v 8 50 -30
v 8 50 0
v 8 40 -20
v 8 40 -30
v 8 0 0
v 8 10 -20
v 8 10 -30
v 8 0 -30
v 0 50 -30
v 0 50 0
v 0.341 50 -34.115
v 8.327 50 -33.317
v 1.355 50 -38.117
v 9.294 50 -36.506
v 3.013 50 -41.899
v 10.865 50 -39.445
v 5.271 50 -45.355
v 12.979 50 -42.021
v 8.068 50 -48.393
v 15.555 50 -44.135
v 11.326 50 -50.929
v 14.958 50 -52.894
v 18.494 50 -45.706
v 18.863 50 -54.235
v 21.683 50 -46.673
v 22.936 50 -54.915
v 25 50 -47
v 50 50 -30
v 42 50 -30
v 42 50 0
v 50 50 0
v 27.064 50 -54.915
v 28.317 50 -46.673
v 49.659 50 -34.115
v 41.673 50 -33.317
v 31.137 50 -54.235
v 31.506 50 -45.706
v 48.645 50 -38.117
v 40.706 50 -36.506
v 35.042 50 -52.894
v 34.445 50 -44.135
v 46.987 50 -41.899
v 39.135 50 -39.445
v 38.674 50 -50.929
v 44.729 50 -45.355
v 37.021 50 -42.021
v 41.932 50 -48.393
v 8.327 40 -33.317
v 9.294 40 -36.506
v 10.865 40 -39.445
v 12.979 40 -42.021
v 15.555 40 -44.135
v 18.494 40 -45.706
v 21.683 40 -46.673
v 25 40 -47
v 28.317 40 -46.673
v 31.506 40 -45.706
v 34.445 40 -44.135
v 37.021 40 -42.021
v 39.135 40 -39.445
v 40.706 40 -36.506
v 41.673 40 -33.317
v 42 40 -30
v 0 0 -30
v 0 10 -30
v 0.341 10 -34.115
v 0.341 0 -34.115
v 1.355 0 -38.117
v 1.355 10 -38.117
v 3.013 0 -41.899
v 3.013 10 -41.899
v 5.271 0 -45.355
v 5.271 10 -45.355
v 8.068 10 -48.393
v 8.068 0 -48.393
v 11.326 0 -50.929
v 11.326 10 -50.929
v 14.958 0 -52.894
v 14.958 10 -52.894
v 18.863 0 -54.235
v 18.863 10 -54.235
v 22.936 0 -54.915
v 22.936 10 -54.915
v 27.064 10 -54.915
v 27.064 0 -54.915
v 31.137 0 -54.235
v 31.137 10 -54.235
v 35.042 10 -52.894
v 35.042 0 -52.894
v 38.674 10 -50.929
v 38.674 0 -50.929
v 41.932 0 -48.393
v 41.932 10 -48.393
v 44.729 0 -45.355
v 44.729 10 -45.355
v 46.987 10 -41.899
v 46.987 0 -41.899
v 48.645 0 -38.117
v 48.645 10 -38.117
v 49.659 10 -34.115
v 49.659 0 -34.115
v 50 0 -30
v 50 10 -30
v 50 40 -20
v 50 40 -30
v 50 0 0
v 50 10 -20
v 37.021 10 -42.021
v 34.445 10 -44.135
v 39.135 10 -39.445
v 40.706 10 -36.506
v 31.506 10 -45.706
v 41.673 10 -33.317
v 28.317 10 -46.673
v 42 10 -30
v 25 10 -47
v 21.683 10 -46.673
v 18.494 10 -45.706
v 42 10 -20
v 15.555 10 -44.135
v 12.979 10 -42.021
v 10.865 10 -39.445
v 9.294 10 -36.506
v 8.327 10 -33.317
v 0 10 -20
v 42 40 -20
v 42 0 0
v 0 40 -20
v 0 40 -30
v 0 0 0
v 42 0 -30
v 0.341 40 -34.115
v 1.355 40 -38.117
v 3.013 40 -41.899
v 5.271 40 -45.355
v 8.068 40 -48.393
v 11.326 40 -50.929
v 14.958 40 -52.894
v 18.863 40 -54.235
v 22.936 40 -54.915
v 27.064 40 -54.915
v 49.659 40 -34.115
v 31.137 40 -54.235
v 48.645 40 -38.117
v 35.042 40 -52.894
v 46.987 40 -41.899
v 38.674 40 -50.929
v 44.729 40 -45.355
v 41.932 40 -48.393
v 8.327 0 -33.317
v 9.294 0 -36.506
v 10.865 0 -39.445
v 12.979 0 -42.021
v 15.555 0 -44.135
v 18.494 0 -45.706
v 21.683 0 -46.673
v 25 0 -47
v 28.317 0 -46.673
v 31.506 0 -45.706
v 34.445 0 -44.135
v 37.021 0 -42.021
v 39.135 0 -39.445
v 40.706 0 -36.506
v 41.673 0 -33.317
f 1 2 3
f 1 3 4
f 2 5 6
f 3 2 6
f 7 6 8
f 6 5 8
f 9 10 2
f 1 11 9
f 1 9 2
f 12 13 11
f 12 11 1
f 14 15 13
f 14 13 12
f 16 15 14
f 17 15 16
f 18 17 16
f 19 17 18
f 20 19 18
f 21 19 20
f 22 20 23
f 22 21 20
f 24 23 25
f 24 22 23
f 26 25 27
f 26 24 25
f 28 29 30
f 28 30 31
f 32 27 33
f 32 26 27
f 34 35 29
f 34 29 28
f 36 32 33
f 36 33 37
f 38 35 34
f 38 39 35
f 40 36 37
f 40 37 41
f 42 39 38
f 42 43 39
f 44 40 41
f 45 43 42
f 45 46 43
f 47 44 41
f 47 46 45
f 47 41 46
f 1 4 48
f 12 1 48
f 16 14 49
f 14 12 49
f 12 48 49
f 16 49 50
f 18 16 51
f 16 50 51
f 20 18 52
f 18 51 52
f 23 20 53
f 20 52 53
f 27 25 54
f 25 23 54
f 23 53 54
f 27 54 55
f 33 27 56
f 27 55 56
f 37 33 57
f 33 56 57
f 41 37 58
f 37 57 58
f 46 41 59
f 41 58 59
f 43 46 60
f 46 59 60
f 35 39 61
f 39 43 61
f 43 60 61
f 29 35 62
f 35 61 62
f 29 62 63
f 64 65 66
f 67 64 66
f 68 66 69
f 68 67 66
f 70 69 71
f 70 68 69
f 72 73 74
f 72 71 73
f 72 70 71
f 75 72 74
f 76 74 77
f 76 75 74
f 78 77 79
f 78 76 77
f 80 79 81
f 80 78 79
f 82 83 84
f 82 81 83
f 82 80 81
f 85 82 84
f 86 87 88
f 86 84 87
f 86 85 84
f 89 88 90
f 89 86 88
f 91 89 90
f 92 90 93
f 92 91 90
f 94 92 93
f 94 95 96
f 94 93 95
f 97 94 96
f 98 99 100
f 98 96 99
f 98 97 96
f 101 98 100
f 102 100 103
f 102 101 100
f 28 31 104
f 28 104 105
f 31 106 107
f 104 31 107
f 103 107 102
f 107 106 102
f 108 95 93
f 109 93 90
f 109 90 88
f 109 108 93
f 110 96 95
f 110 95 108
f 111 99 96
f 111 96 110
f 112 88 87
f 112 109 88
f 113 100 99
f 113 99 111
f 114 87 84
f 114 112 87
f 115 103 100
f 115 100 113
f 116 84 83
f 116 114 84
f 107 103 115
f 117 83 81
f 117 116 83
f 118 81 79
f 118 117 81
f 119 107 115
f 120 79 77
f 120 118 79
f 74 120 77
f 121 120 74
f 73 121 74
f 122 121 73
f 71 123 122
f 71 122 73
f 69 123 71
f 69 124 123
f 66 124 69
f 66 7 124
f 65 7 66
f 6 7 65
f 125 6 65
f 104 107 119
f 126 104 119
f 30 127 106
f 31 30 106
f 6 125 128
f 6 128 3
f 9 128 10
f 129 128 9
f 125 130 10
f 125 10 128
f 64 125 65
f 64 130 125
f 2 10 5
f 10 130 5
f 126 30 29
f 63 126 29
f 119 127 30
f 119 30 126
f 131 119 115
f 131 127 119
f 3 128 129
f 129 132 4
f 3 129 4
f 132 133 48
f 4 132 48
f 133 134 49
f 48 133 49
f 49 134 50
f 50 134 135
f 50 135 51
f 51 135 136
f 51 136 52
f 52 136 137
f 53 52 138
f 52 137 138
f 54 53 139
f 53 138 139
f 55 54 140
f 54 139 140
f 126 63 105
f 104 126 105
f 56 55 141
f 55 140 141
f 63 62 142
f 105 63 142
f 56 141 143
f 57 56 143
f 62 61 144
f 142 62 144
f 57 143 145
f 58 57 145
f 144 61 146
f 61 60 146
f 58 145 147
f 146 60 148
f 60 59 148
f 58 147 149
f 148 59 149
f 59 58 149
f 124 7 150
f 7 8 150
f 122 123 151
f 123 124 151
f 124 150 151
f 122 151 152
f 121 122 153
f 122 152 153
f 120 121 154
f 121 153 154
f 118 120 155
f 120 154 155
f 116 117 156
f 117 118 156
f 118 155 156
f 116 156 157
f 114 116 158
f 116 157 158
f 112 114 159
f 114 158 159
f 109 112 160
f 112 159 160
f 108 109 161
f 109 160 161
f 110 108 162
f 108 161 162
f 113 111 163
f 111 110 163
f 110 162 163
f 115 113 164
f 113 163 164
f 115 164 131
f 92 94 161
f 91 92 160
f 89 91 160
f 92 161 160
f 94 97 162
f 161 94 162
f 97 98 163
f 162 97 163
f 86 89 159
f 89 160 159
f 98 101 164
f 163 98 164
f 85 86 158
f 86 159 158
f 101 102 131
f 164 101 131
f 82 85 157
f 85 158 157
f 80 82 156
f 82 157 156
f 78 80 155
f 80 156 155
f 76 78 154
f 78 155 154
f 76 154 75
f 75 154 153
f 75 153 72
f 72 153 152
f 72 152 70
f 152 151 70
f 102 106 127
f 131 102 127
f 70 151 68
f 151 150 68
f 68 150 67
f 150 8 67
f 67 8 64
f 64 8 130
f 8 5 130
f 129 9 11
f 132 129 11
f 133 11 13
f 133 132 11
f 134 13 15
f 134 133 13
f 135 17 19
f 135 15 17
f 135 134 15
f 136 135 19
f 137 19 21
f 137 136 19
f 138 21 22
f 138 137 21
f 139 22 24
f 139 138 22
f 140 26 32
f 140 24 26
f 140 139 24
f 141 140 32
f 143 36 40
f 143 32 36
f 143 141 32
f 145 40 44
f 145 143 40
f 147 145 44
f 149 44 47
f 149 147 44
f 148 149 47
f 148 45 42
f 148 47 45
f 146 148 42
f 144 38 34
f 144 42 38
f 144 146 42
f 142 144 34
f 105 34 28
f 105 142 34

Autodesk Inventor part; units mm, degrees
ref_plane "YZ Plane" through (0, 0, 0) normal (1, 0, 0) x (0, 1, 0)
ref_plane "XZ Plane" through (0, 0, 0) normal (0, 1, 0) x (-1, 0, 0)
ref_plane "XY Plane" through (0, 0, 0) normal (0, 0, 1) x (1, 0, 0)
sketch "草圖1" plane through (0, 0, 0) normal (0, 1, 0) x (-1, 0, 0)
  line L0 (0, 0) -> (-8, 0)
  line L1 (-8, 0) -> (-8, -30)
  line L2 (0, 0) -> (0, -30)
  arc A0 (-42, -30) -> (-8, -30) centre (-25, -30) ccw
  arc A1 (-50, -30) -> (0, -30) centre (-25, -30) ccw
  line L3 (6.1696, -30) -> (-69.0697, -30) construction
  line L4 (-25, -30) -> (-25, -20.8656)
  line L5 (-42, 0) -> (-42, -30)
  line L6 (-50, 0) -> (-50, -30)
  line L7 (-42, 0) -> (-50, 0)
  dimension "d8" = 30
  dimension "d9" = 8
  dimension "d10" = 25
  dimension "d11" = 17
extrude "擠出1" add sketch "草圖1" along normal blind 10
sketch "草圖2" plane through (0, 10, 0) normal (0, 1, 0) x (1, 0, 0)
  line L0 (0, 30) -> (0, 0) projected
  line L1 (0, 0) -> (0, 20)
  line L2 (0, 20) -> (8, 20)
  line L3 (8, 0) -> (8, 30) projected
  line L4 (8, 20) -> (8, 0)
  line L5 (8, 0) -> (0, 0)
  arc A0 (42, 30) -> (8, 30) centre (25, 30) ccw projected
  line L6 (25, 30) -> (25, 60.7006)
  line L7 (50, 20) -> (50, 0)
  line L8 (50, 0) -> (50, 20)
  line L9 (50, 20) -> (42, 20)
  line L10 (42, 0) -> (42, 20)
  line L11 (42, 20) -> (42, 0)
  line L12 (42, 0) -> (50, 0)
  point P0 (50, 30)
  dimension "d14" = 20
extrude "擠出2" add sketch "草圖2" along normal blind 30
sketch "草圖3" plane through (0, 40, 0) normal (0, 1, 0) x (1, 0, 0)
  line L0 (0, 20) -> (8, 20) projected
  line L1 (8, 20) -> (8, 30) projected
  arc A0 (42, 30) -> (8, 30) centre (25, 30) ccw projected
  line L2 (42, 30) -> (42, 20) projected
  line L3 (42, 20) -> (50, 20) projected
  line L4 (50, 20) -> (50, 30) projected
  arc A1 (50, 30) -> (0, 30) centre (25, 30) ccw projected
  line L5 (0, 30) -> (0, 20) projected
  line L6 (0, 0) -> (8, 0) projected
  line L7 (8, 0) -> (8, 20) projected
  line L8 (8, 20) -> (0, 20) projected
  line L9 (0, 20) -> (0, 0) projected
  line L10 (50, 0) -> (50, 20) projected
  line L11 (50, 20) -> (42, 20) projected
  line L12 (42, 20) -> (42, 0) projected
  line L13 (42, 0) -> (50, 0) projected
extrude "擠出3" add sketch "草圖3" along normal blind 10
properties part number "410571040示範三"
